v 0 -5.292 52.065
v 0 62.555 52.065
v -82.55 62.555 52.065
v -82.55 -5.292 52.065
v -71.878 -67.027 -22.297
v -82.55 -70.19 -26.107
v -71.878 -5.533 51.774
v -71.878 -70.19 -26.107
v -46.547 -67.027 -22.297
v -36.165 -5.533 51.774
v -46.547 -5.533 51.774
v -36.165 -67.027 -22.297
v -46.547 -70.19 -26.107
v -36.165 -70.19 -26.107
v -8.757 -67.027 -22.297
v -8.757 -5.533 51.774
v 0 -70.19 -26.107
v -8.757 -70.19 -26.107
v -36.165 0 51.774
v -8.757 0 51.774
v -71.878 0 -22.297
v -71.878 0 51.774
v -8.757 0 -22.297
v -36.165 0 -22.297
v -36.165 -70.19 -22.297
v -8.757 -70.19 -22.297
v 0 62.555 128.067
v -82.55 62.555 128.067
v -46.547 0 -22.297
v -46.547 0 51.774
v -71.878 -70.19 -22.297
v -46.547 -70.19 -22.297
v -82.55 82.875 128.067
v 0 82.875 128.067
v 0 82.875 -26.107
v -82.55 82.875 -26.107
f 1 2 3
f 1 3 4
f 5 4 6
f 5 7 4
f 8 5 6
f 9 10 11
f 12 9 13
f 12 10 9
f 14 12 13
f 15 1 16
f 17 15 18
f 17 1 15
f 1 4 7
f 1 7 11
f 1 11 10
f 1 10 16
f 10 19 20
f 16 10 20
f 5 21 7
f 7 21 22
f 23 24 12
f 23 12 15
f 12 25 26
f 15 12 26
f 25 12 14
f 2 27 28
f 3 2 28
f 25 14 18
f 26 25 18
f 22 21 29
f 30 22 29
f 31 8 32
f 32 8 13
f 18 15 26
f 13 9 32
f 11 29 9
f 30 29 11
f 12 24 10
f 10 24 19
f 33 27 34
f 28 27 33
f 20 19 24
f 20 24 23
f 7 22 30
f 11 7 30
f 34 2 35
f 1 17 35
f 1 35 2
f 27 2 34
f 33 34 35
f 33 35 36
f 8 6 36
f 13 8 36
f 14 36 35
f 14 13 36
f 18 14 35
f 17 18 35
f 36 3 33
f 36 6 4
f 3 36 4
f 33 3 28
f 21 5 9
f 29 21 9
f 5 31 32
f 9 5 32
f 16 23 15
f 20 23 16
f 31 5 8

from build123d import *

# Parameters (mm, degrees)
F1_DEPTH = 82.55
F2_W     = 82.55
F2_H     = 154.17393
F3_DEPTH = 20.32
F4_W     = 25.331251
F4_H     = 78.070102
F4_W_2   = 27.407586
F4_H_2   = 78.070093
F5_DEPTH = 76.2
F6_W     = 25.331251
F6_H     = 70.189761
F6_W_2   = 27.407586
F7_DEPTH = 3.81


with BuildPart() as f1:
    # F0 (on Right) → F1 (new body)
    with BuildSketch(Plane.YZ):
        Polygon((-5.292215, 52.064744), (-70.189761, -26.107301), (62.555218, -26.107301), (62.555218, 52.064744), align=None)
    extrude(amount=-F1_DEPTH)

    # F2 (on face) → F3 (join)
    with BuildSketch(Plane(origin=(0, 62.555218, 0), x_dir=(-1, 0, 0), z_dir=(0, 1, 0))):
        with Locations((41.275, 50.979664)):
            Rectangle(F2_W, F2_H)
    extrude(amount=F3_DEPTH)

    # F4 (on Front) → F5 (cut)
    with BuildSketch(Plane.XZ):
        with Locations((-59.212166, 12.739294)):
            Rectangle(F4_W, F4_H)
        with Locations((-22.461083, 12.739295)):
            Rectangle(F4_W_2, F4_H_2)
    extrude(amount=F5_DEPTH, mode=Mode.SUBTRACT)

    # F6 (on face) → F7 (join)
    with BuildSketch(Plane(origin=(0, 0, -26.107301), x_dir=(1, 0, 0), z_dir=(0, 0, -1))):
        with Locations((-59.212166, 35.09488)):
            Rectangle(F6_W, F6_H)
        with Locations((-22.461083, 35.09488)):
            Rectangle(F6_W_2, F6_H)
    extrude(amount=-F7_DEPTH)


solid = f1.part
